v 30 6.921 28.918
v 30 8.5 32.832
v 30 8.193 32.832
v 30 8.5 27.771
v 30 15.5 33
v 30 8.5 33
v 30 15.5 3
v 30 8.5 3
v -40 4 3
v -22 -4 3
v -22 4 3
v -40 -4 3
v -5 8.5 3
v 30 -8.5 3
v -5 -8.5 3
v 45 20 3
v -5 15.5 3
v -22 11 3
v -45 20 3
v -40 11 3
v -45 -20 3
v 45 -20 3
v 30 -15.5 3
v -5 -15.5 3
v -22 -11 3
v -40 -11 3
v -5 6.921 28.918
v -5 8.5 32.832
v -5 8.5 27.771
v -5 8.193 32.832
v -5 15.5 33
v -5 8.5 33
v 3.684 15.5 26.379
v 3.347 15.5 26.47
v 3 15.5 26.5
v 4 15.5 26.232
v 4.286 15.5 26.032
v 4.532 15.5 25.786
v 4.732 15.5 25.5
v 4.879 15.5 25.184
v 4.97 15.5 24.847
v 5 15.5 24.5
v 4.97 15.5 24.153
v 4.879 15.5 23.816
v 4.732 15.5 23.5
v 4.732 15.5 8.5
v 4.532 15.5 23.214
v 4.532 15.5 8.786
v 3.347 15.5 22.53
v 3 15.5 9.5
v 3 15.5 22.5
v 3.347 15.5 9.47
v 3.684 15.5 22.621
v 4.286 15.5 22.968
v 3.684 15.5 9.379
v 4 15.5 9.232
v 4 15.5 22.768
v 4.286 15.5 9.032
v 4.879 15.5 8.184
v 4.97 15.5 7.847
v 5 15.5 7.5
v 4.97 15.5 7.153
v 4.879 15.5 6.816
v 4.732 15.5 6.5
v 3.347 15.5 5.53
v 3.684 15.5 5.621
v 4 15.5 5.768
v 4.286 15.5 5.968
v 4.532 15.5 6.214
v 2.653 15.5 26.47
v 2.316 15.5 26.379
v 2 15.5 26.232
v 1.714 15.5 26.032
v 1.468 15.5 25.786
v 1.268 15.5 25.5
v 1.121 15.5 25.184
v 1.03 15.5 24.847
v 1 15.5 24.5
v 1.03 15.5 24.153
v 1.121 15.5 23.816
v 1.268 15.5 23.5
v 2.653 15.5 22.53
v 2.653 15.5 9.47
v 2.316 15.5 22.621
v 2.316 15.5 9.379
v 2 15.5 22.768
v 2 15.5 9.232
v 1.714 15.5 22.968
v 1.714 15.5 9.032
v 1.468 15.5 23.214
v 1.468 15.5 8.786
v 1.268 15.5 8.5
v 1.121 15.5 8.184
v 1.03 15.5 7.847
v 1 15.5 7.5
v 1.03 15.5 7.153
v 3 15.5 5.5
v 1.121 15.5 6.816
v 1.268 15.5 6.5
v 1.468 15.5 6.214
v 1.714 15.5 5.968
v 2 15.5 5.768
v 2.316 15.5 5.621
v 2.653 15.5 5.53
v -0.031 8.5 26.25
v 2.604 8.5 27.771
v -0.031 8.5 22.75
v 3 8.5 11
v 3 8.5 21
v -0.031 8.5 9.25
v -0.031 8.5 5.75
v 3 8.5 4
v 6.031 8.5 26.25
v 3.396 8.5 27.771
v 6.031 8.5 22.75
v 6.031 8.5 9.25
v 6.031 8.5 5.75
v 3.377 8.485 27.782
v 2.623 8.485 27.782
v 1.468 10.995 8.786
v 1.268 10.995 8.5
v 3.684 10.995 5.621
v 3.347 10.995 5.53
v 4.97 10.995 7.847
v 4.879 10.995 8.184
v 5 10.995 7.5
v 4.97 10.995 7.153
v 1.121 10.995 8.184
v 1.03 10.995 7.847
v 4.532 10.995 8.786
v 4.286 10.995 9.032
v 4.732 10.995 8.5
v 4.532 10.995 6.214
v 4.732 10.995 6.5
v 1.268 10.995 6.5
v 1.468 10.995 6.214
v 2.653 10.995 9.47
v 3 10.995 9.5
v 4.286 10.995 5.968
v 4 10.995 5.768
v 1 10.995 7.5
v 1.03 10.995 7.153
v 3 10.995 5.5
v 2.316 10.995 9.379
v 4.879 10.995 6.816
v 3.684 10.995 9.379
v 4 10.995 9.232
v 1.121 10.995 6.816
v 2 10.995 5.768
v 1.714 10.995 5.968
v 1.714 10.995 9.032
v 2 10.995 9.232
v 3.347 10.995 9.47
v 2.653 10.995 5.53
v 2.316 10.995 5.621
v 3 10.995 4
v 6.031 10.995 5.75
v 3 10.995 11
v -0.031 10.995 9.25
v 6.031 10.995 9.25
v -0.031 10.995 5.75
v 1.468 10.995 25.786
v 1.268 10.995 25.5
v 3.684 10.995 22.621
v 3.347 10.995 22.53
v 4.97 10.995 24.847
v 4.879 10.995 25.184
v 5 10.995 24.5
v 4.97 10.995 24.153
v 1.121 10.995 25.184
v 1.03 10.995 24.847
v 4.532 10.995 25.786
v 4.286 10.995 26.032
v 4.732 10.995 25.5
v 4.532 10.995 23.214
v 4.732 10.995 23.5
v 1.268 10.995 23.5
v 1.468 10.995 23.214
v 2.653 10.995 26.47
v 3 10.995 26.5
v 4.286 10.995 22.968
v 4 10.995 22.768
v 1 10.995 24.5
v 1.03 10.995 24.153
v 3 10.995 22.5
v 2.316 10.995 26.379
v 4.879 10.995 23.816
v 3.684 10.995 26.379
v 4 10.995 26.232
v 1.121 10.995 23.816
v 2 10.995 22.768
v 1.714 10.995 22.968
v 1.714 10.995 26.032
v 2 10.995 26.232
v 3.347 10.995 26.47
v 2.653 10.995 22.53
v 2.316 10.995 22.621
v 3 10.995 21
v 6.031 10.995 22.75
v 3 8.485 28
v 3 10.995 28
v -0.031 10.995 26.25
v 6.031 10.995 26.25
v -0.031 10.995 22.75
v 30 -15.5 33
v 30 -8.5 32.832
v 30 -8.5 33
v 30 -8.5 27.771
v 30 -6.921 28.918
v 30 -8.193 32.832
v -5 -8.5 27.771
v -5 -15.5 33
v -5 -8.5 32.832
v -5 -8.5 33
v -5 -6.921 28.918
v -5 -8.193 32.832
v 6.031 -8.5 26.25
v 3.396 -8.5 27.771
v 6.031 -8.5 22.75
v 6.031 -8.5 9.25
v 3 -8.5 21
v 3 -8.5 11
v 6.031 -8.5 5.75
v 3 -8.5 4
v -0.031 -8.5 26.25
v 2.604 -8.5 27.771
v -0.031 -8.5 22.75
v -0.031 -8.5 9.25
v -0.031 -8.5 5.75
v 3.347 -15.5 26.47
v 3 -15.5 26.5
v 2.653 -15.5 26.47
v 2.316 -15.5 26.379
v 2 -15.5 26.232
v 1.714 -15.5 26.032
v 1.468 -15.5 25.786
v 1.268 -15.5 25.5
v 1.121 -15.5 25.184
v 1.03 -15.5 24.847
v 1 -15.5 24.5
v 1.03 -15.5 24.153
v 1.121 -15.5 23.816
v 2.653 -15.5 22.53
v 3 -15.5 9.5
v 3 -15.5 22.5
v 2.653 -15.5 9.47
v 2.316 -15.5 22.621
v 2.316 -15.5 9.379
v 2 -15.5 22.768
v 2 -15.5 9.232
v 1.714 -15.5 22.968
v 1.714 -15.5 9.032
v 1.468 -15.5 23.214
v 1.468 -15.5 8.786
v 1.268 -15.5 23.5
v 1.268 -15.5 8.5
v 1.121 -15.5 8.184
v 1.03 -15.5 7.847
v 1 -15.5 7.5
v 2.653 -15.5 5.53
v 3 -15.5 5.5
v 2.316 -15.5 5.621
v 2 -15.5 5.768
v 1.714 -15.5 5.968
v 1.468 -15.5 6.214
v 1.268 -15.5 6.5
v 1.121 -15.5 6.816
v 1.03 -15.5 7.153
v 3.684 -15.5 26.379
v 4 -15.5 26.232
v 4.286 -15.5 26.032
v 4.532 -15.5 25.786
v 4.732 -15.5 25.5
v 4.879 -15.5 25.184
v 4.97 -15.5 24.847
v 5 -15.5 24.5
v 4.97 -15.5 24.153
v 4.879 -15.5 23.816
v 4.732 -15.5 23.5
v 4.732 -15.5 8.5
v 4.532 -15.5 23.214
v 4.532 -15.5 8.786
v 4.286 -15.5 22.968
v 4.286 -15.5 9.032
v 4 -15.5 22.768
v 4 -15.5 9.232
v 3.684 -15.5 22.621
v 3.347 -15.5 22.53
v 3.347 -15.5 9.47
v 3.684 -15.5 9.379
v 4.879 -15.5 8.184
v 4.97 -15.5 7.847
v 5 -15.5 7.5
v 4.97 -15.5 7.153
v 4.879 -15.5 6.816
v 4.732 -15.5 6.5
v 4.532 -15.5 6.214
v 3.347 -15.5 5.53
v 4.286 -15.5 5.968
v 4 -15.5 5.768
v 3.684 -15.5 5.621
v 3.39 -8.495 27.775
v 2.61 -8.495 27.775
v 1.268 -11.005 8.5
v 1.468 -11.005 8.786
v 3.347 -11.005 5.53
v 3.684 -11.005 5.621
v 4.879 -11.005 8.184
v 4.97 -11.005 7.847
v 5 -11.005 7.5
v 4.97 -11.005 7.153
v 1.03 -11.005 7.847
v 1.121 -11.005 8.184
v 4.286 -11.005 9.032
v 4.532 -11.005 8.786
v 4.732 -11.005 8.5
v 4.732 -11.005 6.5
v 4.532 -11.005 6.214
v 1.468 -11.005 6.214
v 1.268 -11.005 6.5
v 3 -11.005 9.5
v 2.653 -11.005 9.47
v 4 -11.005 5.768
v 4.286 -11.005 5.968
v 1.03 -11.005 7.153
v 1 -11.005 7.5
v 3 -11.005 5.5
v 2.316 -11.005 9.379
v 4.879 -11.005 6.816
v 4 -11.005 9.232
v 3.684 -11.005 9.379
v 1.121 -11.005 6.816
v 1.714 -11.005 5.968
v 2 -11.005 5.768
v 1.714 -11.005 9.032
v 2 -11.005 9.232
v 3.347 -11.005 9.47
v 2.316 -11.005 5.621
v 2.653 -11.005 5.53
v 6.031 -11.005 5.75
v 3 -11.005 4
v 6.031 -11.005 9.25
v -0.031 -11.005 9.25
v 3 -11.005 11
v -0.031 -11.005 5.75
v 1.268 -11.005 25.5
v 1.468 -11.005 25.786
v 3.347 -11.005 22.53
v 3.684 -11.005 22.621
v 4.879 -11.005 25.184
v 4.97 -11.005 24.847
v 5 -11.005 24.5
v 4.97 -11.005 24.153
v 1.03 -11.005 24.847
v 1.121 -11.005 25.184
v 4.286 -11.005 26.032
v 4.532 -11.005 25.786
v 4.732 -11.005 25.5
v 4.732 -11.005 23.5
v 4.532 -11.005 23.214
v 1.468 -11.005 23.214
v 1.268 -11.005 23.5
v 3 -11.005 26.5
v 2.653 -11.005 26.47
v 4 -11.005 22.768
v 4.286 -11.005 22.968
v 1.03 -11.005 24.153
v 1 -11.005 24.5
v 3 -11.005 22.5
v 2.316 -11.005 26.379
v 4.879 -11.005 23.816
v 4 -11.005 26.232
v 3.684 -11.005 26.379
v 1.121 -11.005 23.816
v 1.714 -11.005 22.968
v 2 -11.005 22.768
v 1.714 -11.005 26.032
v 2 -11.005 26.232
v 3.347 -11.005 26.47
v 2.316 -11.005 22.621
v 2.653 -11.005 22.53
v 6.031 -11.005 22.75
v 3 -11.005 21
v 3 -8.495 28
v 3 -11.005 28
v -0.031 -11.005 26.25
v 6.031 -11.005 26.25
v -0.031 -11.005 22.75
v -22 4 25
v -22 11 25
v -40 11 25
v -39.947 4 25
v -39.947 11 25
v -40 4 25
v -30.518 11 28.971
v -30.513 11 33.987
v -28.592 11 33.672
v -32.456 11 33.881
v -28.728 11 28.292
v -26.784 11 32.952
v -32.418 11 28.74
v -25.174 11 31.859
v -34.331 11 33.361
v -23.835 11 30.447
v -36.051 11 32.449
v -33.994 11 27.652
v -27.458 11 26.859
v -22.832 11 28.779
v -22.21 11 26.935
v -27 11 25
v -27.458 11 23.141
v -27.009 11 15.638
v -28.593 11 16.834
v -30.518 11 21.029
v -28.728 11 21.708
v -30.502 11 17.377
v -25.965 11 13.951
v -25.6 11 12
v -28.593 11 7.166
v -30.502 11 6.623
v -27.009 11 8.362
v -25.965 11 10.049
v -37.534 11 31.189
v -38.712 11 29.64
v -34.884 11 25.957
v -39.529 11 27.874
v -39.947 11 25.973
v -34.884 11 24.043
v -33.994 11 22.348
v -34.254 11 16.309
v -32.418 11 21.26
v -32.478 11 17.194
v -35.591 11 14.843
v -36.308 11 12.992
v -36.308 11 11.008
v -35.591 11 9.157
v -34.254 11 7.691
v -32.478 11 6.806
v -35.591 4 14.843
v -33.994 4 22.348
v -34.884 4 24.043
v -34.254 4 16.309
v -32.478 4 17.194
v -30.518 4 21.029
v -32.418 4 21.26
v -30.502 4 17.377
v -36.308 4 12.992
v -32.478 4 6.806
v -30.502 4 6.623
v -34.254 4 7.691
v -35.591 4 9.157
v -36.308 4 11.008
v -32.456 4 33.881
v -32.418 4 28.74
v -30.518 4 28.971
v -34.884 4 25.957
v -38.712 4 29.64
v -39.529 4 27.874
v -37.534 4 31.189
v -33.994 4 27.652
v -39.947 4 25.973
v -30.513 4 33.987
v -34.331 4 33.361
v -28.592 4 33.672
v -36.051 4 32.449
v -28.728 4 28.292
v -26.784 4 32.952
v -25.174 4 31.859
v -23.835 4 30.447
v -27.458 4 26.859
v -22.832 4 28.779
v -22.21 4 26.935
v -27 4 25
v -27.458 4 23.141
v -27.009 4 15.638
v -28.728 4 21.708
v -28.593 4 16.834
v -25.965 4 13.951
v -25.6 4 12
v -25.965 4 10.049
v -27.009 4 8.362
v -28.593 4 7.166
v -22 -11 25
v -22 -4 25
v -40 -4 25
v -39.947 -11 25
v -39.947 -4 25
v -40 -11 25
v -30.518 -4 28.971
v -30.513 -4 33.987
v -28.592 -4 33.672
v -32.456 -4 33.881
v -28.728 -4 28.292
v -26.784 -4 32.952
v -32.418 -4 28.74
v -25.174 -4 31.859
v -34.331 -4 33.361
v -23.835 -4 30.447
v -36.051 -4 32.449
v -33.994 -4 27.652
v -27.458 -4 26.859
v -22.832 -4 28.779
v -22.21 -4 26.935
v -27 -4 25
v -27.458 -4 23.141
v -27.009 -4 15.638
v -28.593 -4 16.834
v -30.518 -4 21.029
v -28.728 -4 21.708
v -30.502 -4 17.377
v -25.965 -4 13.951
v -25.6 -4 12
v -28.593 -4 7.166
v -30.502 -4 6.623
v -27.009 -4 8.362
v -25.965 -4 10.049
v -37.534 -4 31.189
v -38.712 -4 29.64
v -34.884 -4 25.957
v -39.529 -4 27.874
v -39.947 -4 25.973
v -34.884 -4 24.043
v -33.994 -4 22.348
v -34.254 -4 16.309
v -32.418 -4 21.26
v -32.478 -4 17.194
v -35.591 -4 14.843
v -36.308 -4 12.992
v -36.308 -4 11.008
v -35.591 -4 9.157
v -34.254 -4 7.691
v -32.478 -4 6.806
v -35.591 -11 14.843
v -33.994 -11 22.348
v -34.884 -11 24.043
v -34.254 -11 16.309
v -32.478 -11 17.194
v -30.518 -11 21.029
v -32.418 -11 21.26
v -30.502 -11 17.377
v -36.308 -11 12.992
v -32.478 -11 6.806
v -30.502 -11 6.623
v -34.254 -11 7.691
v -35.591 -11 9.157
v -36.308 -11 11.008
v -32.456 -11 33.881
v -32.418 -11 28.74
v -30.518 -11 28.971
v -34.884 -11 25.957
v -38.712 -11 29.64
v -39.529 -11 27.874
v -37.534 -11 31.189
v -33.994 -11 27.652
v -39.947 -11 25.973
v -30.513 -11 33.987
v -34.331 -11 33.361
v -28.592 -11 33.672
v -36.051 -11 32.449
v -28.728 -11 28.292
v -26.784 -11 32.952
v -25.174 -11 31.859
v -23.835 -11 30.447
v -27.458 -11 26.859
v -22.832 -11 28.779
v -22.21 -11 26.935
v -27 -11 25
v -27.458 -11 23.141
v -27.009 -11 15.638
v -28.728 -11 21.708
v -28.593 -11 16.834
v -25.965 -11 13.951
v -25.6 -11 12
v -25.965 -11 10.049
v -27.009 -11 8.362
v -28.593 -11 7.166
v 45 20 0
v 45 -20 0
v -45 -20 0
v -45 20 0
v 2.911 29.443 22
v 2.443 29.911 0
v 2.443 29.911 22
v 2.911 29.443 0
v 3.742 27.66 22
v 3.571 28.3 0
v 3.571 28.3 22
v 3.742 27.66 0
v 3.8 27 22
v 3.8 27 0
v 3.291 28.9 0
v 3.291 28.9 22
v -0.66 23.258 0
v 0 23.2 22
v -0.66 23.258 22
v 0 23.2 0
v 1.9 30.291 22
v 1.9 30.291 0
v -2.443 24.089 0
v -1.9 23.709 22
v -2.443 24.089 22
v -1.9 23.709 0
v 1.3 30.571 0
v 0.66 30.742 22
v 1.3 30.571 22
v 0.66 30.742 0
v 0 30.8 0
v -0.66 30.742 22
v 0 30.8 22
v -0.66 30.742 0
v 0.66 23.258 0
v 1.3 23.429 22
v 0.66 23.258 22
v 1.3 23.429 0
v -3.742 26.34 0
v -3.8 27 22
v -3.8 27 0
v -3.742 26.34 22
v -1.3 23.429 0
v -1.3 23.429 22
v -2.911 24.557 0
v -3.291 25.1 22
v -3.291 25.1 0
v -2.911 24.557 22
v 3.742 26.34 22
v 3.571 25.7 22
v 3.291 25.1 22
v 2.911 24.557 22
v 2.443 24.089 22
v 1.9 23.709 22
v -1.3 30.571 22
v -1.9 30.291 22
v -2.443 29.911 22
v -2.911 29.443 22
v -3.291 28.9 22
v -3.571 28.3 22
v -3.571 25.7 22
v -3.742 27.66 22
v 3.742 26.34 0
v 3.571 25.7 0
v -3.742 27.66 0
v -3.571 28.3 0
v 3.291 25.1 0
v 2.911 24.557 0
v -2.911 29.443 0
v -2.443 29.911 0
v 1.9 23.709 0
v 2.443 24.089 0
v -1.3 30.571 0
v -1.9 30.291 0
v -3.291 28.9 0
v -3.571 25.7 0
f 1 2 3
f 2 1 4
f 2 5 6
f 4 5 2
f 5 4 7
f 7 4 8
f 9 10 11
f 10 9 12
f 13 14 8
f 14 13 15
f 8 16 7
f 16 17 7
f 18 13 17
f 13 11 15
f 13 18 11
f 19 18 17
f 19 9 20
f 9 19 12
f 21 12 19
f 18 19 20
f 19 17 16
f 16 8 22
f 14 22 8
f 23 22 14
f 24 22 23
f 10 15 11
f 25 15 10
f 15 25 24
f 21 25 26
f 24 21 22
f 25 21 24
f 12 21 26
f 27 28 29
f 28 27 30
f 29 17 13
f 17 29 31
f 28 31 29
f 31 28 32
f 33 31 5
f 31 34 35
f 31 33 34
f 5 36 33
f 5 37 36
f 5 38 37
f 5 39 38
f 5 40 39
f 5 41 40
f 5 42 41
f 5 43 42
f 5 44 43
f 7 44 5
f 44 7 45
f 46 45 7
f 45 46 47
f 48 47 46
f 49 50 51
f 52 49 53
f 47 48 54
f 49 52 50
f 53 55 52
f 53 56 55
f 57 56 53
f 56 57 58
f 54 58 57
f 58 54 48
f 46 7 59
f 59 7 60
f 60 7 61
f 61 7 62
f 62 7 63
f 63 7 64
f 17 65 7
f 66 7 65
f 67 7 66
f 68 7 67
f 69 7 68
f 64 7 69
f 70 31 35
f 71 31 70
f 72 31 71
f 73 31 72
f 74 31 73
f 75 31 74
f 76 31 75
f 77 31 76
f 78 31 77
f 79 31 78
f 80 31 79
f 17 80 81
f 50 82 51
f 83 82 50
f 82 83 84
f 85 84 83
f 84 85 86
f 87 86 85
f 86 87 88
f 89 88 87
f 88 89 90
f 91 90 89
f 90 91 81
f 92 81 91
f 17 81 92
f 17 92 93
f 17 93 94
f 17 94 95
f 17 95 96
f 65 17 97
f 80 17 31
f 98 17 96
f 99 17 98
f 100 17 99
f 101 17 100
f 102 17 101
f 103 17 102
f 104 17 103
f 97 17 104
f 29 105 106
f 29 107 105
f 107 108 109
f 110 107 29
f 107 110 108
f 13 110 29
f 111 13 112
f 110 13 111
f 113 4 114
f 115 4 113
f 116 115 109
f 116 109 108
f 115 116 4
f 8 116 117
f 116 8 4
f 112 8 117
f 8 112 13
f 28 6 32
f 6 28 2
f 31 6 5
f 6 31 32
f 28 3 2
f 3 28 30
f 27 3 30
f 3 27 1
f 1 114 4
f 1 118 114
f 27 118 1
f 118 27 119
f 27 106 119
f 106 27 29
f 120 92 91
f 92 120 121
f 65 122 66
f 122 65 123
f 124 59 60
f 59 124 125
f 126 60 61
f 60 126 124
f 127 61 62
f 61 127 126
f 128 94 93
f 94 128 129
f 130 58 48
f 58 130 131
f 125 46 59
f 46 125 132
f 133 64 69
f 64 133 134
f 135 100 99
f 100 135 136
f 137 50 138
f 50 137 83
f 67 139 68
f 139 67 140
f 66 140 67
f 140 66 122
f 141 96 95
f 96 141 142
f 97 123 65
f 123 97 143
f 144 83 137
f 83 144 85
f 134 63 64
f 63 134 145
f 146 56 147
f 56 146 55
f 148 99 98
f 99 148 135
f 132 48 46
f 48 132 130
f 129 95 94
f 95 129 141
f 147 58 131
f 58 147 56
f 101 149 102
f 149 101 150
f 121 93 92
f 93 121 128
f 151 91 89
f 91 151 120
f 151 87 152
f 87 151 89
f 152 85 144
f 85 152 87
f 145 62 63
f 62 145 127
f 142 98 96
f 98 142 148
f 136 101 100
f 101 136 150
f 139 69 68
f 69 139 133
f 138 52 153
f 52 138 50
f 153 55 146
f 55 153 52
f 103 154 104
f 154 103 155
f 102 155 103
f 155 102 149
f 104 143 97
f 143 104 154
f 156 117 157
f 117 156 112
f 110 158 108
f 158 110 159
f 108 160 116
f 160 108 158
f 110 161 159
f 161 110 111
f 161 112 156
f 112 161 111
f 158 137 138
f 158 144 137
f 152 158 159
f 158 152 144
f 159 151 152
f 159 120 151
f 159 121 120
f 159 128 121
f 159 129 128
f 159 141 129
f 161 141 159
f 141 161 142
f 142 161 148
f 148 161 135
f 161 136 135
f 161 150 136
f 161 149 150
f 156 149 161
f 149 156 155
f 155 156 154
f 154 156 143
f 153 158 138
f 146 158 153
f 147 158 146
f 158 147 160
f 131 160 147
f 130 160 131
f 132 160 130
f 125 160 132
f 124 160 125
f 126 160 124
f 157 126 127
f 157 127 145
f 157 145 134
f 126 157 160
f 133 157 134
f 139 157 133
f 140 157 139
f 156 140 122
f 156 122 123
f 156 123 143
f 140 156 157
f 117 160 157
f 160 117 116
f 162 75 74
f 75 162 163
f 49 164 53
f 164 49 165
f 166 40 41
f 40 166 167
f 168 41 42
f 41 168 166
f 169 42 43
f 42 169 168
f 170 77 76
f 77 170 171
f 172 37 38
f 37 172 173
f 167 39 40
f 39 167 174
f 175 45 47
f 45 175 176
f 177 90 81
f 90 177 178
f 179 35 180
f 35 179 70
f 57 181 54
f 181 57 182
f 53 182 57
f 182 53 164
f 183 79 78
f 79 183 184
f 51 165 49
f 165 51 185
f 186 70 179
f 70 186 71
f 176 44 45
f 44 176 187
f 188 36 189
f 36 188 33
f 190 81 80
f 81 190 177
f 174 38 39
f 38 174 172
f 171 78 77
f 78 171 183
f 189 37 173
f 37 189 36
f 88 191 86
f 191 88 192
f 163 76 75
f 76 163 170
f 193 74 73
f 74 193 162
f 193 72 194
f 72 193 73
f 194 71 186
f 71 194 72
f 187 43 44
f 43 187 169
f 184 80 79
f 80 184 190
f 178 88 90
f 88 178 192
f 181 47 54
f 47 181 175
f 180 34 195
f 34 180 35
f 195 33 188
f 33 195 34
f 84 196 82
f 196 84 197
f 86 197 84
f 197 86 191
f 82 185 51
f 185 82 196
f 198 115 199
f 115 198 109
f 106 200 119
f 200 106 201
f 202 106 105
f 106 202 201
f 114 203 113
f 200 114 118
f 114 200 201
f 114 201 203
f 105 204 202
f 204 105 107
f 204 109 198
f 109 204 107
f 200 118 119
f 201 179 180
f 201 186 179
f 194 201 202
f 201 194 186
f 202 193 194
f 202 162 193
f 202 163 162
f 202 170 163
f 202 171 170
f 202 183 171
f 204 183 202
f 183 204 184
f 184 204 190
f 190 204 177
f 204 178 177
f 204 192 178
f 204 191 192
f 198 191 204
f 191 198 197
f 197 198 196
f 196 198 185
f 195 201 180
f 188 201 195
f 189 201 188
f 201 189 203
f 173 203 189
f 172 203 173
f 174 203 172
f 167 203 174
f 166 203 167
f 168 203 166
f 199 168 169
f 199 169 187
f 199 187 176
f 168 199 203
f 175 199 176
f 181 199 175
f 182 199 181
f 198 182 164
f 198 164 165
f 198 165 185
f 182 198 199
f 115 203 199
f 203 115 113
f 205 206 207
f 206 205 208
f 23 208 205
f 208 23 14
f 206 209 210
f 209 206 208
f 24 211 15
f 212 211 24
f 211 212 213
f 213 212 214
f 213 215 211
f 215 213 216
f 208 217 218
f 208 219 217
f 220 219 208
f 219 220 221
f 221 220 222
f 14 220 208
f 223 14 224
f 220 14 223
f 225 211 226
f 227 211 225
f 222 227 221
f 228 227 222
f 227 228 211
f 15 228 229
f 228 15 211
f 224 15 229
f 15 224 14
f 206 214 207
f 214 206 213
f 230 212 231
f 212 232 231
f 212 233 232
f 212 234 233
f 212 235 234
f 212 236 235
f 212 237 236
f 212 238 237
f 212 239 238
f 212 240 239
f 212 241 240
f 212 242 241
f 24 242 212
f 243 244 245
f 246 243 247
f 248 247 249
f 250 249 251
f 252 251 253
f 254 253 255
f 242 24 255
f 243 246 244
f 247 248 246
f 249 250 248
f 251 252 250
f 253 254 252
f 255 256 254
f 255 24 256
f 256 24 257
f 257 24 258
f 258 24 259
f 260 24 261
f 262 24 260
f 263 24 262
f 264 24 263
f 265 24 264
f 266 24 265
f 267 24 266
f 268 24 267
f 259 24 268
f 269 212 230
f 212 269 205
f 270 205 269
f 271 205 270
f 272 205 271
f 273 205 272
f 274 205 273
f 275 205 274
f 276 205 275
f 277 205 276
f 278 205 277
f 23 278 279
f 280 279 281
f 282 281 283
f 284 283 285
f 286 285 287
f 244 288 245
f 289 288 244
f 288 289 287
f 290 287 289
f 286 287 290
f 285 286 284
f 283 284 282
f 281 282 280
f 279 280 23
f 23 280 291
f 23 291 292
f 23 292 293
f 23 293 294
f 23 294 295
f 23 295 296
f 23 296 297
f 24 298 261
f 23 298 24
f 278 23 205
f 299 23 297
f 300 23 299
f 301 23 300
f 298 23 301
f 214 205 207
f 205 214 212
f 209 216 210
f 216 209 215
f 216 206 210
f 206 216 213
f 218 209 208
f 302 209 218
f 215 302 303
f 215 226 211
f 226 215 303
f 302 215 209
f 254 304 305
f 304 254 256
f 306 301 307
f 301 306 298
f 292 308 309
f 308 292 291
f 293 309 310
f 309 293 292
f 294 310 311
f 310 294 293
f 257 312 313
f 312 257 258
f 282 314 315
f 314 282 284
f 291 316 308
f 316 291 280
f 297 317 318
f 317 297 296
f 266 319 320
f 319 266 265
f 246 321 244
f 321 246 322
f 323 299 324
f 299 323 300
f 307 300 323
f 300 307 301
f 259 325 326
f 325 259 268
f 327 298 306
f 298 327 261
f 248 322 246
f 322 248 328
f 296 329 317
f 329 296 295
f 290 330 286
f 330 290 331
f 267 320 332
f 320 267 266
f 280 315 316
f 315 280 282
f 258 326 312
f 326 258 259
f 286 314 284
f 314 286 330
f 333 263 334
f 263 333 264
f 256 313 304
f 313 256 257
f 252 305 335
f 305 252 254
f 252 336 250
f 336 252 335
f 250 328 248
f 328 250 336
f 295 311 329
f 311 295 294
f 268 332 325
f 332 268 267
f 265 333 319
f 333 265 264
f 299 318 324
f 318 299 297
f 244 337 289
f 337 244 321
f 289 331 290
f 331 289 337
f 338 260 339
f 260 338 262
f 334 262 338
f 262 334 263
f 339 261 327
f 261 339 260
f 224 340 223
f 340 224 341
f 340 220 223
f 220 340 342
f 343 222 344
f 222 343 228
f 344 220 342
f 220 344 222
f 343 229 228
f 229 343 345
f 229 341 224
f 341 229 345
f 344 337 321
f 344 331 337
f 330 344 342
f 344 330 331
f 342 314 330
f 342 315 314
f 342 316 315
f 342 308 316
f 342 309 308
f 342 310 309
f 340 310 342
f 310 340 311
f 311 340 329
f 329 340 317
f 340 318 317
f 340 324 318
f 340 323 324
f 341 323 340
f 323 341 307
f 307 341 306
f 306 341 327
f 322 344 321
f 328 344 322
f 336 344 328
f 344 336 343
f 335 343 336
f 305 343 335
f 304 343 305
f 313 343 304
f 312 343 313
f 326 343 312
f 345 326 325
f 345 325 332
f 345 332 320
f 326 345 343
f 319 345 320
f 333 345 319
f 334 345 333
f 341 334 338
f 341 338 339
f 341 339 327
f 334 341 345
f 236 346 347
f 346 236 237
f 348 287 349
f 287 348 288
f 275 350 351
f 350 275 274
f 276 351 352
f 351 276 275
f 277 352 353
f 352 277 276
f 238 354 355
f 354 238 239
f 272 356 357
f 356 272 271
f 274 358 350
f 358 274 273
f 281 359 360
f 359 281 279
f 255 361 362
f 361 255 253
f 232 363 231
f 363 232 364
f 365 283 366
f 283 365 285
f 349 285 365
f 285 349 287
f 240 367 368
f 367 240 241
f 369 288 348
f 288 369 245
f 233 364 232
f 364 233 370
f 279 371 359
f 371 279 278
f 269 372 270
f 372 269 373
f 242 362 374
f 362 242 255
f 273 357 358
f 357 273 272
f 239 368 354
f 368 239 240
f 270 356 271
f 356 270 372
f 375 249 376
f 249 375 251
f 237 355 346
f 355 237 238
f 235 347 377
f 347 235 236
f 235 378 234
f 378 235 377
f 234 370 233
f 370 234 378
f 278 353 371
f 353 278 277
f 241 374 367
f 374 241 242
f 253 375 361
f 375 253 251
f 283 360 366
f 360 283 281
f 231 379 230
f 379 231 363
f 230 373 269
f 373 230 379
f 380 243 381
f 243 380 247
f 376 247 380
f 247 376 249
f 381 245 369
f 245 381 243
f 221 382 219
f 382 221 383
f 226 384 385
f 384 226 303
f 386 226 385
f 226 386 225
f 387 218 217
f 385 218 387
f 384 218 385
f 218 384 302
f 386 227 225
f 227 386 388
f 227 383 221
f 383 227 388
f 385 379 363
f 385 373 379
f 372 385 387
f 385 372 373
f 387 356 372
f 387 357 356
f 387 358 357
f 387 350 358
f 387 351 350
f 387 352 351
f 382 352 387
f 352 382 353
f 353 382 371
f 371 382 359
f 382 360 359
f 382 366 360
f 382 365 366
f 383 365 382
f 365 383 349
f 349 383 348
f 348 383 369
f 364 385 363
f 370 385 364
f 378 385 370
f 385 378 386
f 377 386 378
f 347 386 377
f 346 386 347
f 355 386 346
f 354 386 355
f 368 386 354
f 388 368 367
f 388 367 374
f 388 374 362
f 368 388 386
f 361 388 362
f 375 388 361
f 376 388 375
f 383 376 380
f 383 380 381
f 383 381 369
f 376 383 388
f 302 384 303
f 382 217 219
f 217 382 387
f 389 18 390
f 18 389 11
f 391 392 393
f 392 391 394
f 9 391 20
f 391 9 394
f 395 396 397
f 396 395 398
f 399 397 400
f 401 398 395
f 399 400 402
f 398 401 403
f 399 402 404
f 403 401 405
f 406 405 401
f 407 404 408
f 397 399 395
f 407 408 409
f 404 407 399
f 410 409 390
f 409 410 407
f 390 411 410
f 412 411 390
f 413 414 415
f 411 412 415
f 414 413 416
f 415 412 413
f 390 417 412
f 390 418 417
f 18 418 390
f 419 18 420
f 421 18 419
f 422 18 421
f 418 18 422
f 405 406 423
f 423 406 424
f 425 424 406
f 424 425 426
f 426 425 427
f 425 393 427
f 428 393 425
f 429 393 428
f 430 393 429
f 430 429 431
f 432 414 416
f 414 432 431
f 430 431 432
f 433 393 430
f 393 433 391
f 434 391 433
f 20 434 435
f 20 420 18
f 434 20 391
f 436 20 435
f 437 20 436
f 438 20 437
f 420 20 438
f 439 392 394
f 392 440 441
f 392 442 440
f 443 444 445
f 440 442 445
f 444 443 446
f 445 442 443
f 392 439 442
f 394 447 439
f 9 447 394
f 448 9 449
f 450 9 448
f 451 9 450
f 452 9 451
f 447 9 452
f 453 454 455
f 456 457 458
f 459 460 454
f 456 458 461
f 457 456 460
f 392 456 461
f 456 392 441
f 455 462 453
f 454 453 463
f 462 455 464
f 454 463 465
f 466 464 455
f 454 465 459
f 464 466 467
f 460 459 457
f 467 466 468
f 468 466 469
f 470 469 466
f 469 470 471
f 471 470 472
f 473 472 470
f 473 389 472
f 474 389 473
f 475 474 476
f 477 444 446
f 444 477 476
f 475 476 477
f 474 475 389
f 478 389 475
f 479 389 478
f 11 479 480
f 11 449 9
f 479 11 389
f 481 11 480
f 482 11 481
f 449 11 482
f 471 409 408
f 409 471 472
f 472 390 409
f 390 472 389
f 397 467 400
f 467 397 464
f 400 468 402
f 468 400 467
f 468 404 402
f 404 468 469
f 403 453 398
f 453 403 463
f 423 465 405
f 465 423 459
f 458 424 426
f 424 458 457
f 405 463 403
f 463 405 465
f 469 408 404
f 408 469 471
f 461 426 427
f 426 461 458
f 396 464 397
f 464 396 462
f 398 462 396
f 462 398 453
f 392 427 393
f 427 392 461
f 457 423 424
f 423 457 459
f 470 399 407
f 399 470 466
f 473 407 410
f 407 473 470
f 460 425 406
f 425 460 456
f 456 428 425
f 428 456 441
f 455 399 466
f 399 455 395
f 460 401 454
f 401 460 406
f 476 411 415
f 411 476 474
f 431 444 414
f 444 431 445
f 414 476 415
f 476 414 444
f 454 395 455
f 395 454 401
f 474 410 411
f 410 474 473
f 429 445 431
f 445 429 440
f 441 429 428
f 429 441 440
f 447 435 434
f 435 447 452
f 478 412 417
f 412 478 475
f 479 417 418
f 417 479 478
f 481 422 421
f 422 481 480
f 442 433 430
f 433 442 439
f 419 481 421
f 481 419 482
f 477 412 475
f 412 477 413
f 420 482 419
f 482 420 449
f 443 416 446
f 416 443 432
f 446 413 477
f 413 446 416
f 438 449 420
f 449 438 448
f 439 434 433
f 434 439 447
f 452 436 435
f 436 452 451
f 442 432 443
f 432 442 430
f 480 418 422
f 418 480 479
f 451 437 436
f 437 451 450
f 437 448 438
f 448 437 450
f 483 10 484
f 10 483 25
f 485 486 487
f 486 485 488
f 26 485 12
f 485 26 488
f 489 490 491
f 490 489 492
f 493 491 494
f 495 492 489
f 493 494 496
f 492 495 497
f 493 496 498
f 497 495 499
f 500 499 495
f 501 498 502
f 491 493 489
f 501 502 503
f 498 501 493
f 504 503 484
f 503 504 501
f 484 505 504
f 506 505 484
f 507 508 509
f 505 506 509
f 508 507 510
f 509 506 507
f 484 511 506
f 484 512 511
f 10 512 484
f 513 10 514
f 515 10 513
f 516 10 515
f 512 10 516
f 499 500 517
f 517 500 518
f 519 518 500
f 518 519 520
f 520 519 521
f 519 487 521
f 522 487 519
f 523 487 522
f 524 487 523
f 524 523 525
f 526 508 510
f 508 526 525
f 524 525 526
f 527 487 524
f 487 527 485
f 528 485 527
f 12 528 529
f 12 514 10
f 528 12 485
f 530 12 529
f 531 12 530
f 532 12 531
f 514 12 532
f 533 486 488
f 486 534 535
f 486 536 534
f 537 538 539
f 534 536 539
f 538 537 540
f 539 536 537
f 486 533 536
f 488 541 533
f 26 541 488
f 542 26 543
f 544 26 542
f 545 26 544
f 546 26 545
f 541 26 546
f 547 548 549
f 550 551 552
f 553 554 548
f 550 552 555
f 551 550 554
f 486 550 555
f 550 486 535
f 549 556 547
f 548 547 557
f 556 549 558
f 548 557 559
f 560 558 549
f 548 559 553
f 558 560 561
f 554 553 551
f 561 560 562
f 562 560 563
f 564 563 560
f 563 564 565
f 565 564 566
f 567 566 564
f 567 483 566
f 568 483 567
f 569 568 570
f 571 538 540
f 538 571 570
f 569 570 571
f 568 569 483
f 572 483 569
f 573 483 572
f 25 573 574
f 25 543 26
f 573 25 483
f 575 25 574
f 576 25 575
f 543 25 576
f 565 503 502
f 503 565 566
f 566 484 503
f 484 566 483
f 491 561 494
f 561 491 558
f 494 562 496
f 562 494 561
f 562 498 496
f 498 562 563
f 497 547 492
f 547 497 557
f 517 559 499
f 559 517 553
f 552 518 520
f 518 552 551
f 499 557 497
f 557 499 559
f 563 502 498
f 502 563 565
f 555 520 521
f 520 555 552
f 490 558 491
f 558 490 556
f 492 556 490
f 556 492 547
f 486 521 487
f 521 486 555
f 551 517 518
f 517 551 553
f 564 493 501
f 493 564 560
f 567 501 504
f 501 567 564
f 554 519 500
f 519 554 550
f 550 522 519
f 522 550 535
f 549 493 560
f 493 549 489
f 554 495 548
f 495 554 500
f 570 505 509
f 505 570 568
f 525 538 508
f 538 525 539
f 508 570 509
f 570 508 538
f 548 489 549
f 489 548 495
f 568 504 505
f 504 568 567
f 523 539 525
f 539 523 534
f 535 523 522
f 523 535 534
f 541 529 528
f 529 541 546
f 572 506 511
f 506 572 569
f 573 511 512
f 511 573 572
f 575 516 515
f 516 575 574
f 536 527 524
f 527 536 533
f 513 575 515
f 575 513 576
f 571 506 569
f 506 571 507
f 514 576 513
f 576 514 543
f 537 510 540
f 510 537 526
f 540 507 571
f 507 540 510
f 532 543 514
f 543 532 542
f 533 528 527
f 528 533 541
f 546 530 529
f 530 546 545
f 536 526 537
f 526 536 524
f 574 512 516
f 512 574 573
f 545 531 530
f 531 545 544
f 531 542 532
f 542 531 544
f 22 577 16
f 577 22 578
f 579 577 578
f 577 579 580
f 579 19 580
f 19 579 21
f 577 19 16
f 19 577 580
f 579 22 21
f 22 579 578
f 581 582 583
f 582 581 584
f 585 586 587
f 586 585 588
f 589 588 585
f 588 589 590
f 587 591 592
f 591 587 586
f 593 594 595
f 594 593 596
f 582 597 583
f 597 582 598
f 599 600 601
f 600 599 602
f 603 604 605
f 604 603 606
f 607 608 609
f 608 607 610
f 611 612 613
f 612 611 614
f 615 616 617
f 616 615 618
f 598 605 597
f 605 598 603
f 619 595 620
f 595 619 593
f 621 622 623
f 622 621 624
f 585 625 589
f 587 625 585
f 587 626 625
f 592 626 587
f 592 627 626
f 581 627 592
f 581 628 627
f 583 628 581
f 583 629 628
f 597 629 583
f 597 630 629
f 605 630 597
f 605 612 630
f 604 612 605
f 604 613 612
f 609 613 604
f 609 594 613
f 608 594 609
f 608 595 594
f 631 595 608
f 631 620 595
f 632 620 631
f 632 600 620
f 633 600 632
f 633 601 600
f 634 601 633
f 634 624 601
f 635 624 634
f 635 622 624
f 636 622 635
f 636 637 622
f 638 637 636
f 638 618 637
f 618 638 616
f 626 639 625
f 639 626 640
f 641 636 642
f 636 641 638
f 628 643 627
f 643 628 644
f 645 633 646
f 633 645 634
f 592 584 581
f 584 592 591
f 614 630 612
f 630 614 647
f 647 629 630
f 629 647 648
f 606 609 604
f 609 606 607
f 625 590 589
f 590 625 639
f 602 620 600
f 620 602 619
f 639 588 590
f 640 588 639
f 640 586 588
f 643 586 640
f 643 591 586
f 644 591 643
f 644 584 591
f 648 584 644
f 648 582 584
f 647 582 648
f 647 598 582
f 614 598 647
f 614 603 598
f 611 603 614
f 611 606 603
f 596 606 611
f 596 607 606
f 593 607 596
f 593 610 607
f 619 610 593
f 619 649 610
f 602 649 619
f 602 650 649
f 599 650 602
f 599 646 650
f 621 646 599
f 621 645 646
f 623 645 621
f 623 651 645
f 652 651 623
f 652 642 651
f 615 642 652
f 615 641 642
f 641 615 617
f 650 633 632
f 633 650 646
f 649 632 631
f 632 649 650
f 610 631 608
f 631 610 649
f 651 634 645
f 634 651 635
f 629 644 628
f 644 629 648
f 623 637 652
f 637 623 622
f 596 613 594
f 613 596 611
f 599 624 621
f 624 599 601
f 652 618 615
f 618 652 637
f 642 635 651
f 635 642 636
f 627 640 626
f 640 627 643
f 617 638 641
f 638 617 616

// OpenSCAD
platform_length = 90;
platform_width = 40;
platform_thickness = 3;

frame_length = 35;
frame_heigth = 26;
frame_thickness = 7;
frame_spacing = 17;
frame_offset_x = 5;
motor_holes_radius = 2;
motor_holes_spacing = 17;
motor_holes_offset = 8;
battery_holder_offset = 1;
filler_heigth = 4; // Gessing ...

front_skate_radius = 9;
front_skate_length = 22;
front_skate_offset = 5;
bearing_thickness = 8;
bearing_radius = 4;

offset = 0.01;

// M3 nut 
nut_m3_radius = 3.5; //mm
nut_m3_thickness = 2.5; //mm

module m3_nut()
{
	rotate(a=90,v=[1,0,0])
		rotate(a=30,v=[0,0,1])
			cylinder(r=nut_m3_radius, h=nut_m3_thickness+offset, $fn=6);
}

module frame_side(right)
{
	difference()
	{
		union()
		{
			// Base
			translate([0,frame_thickness/-2,0])
				cube([frame_length,frame_thickness,frame_heigth]);

			// Top filler
			translate([0,frame_thickness/-2,frame_heigth])
				cube([frame_length,frame_thickness,filler_heigth]);

			// Top battery holder	
			if(!right)
				translate([0,frame_thickness/4,frame_heigth+battery_holder_offset])
					rotate(a=90,v=[0,1,0])
						cylinder(r=frame_thickness/2, h=frame_length, $fn=5);
			else
				translate([0,frame_thickness/-4,frame_heigth+battery_holder_offset])
					rotate(a=90,v=[0,1,0])
						cylinder(r=frame_thickness/2, h=frame_length, $fn=5);
		}
	
		// Bottom hole 
		translate([	motor_holes_offset,
					frame_thickness+frame_thickness/-2+offset/2,
					(frame_heigth-motor_holes_spacing)/2])
			rotate(a=90,v=[1,0,0])
				cylinder(r=motor_holes_radius, h=frame_thickness+offset, $fn=36);	

		// Bottom hole hex nut		
		if(right)
			translate([	motor_holes_offset,
						frame_thickness/-2+nut_m3_thickness-offset/2,
						(frame_heigth-motor_holes_spacing)/2])
				m3_nut();
		else
			translate([	motor_holes_offset,
						frame_thickness+frame_thickness/-2+offset/2,
						(frame_heigth-motor_holes_spacing)/2])
				m3_nut();			
		
		// Top hole 
		translate([	motor_holes_offset,
					frame_thickness+frame_thickness/-2+offset/2,
					(frame_heigth-motor_holes_spacing)/2+motor_holes_spacing])
			rotate(a=90,v=[1,0,0])
				cylinder(r=motor_holes_radius, h=frame_thickness+offset, $fn=36);	

		// Top hole hex nut		
		if(right == true)
			translate([	motor_holes_offset,
						frame_thickness/-2+nut_m3_thickness-offset/2,
						(frame_heigth-motor_holes_spacing)/2+motor_holes_spacing])
				m3_nut();
		else
			translate([	motor_holes_offset,
						frame_thickness+frame_thickness/-2+offset/2,
						(frame_heigth-motor_holes_spacing)/2+motor_holes_spacing])
				m3_nut();				
	}
}

module skate()
{
	difference()
	{
		union()
		{
			// Skate Leg
			translate([0,frame_thickness/-2,0])
				cube([2*front_skate_radius,frame_thickness,front_skate_length]);

			// Skate
			translate([front_skate_radius,frame_thickness/2,front_skate_length])
				rotate(a=90,v=[1,0,0])
					cylinder(r=front_skate_radius, h=frame_thickness);
		}

		// Skate hole
		translate([front_skate_radius,frame_thickness/2+offset/2,front_skate_length])
			rotate(a=90,v=[1,0,0])
				cylinder(r=bearing_radius, h=frame_thickness+offset);

		// Skate Top hole
		translate([front_skate_radius,frame_thickness/2+offset/2,front_skate_length/2-bearing_radius/2])
			rotate(a=90,v=[1,0,0])
				cylinder(r=0.6*front_skate_radius, h=frame_thickness+offset);
	}
}

module all()
{
	union()
	{
		// Top Plate
		translate([platform_length/-2.0,platform_width/-2.0,0])
			cube([platform_length,platform_width,platform_thickness]);

		// Right frame
		translate([0-frame_offset_x,frame_thickness/2+frame_spacing/2,platform_thickness])
			frame_side(true);

		// Left frame
		translate([0-frame_offset_x,frame_thickness/-2+frame_spacing/-2,platform_thickness])
			frame_side(false);

		translate([	platform_length/-2+front_skate_offset,
					frame_thickness/2 + bearing_thickness/2,
					platform_thickness])
			skate();

		translate([	platform_length/-2+front_skate_offset,
					frame_thickness/-2 + bearing_thickness/-2,
					platform_thickness])
			skate();
	}
}

module shaft()
{
	translate([0,platform_width/2+bearing_radius+3,0])
		cylinder(r=0.95*bearing_radius,h=bearing_thickness+2*frame_thickness, $fn=36);
}

shaft();
all();
